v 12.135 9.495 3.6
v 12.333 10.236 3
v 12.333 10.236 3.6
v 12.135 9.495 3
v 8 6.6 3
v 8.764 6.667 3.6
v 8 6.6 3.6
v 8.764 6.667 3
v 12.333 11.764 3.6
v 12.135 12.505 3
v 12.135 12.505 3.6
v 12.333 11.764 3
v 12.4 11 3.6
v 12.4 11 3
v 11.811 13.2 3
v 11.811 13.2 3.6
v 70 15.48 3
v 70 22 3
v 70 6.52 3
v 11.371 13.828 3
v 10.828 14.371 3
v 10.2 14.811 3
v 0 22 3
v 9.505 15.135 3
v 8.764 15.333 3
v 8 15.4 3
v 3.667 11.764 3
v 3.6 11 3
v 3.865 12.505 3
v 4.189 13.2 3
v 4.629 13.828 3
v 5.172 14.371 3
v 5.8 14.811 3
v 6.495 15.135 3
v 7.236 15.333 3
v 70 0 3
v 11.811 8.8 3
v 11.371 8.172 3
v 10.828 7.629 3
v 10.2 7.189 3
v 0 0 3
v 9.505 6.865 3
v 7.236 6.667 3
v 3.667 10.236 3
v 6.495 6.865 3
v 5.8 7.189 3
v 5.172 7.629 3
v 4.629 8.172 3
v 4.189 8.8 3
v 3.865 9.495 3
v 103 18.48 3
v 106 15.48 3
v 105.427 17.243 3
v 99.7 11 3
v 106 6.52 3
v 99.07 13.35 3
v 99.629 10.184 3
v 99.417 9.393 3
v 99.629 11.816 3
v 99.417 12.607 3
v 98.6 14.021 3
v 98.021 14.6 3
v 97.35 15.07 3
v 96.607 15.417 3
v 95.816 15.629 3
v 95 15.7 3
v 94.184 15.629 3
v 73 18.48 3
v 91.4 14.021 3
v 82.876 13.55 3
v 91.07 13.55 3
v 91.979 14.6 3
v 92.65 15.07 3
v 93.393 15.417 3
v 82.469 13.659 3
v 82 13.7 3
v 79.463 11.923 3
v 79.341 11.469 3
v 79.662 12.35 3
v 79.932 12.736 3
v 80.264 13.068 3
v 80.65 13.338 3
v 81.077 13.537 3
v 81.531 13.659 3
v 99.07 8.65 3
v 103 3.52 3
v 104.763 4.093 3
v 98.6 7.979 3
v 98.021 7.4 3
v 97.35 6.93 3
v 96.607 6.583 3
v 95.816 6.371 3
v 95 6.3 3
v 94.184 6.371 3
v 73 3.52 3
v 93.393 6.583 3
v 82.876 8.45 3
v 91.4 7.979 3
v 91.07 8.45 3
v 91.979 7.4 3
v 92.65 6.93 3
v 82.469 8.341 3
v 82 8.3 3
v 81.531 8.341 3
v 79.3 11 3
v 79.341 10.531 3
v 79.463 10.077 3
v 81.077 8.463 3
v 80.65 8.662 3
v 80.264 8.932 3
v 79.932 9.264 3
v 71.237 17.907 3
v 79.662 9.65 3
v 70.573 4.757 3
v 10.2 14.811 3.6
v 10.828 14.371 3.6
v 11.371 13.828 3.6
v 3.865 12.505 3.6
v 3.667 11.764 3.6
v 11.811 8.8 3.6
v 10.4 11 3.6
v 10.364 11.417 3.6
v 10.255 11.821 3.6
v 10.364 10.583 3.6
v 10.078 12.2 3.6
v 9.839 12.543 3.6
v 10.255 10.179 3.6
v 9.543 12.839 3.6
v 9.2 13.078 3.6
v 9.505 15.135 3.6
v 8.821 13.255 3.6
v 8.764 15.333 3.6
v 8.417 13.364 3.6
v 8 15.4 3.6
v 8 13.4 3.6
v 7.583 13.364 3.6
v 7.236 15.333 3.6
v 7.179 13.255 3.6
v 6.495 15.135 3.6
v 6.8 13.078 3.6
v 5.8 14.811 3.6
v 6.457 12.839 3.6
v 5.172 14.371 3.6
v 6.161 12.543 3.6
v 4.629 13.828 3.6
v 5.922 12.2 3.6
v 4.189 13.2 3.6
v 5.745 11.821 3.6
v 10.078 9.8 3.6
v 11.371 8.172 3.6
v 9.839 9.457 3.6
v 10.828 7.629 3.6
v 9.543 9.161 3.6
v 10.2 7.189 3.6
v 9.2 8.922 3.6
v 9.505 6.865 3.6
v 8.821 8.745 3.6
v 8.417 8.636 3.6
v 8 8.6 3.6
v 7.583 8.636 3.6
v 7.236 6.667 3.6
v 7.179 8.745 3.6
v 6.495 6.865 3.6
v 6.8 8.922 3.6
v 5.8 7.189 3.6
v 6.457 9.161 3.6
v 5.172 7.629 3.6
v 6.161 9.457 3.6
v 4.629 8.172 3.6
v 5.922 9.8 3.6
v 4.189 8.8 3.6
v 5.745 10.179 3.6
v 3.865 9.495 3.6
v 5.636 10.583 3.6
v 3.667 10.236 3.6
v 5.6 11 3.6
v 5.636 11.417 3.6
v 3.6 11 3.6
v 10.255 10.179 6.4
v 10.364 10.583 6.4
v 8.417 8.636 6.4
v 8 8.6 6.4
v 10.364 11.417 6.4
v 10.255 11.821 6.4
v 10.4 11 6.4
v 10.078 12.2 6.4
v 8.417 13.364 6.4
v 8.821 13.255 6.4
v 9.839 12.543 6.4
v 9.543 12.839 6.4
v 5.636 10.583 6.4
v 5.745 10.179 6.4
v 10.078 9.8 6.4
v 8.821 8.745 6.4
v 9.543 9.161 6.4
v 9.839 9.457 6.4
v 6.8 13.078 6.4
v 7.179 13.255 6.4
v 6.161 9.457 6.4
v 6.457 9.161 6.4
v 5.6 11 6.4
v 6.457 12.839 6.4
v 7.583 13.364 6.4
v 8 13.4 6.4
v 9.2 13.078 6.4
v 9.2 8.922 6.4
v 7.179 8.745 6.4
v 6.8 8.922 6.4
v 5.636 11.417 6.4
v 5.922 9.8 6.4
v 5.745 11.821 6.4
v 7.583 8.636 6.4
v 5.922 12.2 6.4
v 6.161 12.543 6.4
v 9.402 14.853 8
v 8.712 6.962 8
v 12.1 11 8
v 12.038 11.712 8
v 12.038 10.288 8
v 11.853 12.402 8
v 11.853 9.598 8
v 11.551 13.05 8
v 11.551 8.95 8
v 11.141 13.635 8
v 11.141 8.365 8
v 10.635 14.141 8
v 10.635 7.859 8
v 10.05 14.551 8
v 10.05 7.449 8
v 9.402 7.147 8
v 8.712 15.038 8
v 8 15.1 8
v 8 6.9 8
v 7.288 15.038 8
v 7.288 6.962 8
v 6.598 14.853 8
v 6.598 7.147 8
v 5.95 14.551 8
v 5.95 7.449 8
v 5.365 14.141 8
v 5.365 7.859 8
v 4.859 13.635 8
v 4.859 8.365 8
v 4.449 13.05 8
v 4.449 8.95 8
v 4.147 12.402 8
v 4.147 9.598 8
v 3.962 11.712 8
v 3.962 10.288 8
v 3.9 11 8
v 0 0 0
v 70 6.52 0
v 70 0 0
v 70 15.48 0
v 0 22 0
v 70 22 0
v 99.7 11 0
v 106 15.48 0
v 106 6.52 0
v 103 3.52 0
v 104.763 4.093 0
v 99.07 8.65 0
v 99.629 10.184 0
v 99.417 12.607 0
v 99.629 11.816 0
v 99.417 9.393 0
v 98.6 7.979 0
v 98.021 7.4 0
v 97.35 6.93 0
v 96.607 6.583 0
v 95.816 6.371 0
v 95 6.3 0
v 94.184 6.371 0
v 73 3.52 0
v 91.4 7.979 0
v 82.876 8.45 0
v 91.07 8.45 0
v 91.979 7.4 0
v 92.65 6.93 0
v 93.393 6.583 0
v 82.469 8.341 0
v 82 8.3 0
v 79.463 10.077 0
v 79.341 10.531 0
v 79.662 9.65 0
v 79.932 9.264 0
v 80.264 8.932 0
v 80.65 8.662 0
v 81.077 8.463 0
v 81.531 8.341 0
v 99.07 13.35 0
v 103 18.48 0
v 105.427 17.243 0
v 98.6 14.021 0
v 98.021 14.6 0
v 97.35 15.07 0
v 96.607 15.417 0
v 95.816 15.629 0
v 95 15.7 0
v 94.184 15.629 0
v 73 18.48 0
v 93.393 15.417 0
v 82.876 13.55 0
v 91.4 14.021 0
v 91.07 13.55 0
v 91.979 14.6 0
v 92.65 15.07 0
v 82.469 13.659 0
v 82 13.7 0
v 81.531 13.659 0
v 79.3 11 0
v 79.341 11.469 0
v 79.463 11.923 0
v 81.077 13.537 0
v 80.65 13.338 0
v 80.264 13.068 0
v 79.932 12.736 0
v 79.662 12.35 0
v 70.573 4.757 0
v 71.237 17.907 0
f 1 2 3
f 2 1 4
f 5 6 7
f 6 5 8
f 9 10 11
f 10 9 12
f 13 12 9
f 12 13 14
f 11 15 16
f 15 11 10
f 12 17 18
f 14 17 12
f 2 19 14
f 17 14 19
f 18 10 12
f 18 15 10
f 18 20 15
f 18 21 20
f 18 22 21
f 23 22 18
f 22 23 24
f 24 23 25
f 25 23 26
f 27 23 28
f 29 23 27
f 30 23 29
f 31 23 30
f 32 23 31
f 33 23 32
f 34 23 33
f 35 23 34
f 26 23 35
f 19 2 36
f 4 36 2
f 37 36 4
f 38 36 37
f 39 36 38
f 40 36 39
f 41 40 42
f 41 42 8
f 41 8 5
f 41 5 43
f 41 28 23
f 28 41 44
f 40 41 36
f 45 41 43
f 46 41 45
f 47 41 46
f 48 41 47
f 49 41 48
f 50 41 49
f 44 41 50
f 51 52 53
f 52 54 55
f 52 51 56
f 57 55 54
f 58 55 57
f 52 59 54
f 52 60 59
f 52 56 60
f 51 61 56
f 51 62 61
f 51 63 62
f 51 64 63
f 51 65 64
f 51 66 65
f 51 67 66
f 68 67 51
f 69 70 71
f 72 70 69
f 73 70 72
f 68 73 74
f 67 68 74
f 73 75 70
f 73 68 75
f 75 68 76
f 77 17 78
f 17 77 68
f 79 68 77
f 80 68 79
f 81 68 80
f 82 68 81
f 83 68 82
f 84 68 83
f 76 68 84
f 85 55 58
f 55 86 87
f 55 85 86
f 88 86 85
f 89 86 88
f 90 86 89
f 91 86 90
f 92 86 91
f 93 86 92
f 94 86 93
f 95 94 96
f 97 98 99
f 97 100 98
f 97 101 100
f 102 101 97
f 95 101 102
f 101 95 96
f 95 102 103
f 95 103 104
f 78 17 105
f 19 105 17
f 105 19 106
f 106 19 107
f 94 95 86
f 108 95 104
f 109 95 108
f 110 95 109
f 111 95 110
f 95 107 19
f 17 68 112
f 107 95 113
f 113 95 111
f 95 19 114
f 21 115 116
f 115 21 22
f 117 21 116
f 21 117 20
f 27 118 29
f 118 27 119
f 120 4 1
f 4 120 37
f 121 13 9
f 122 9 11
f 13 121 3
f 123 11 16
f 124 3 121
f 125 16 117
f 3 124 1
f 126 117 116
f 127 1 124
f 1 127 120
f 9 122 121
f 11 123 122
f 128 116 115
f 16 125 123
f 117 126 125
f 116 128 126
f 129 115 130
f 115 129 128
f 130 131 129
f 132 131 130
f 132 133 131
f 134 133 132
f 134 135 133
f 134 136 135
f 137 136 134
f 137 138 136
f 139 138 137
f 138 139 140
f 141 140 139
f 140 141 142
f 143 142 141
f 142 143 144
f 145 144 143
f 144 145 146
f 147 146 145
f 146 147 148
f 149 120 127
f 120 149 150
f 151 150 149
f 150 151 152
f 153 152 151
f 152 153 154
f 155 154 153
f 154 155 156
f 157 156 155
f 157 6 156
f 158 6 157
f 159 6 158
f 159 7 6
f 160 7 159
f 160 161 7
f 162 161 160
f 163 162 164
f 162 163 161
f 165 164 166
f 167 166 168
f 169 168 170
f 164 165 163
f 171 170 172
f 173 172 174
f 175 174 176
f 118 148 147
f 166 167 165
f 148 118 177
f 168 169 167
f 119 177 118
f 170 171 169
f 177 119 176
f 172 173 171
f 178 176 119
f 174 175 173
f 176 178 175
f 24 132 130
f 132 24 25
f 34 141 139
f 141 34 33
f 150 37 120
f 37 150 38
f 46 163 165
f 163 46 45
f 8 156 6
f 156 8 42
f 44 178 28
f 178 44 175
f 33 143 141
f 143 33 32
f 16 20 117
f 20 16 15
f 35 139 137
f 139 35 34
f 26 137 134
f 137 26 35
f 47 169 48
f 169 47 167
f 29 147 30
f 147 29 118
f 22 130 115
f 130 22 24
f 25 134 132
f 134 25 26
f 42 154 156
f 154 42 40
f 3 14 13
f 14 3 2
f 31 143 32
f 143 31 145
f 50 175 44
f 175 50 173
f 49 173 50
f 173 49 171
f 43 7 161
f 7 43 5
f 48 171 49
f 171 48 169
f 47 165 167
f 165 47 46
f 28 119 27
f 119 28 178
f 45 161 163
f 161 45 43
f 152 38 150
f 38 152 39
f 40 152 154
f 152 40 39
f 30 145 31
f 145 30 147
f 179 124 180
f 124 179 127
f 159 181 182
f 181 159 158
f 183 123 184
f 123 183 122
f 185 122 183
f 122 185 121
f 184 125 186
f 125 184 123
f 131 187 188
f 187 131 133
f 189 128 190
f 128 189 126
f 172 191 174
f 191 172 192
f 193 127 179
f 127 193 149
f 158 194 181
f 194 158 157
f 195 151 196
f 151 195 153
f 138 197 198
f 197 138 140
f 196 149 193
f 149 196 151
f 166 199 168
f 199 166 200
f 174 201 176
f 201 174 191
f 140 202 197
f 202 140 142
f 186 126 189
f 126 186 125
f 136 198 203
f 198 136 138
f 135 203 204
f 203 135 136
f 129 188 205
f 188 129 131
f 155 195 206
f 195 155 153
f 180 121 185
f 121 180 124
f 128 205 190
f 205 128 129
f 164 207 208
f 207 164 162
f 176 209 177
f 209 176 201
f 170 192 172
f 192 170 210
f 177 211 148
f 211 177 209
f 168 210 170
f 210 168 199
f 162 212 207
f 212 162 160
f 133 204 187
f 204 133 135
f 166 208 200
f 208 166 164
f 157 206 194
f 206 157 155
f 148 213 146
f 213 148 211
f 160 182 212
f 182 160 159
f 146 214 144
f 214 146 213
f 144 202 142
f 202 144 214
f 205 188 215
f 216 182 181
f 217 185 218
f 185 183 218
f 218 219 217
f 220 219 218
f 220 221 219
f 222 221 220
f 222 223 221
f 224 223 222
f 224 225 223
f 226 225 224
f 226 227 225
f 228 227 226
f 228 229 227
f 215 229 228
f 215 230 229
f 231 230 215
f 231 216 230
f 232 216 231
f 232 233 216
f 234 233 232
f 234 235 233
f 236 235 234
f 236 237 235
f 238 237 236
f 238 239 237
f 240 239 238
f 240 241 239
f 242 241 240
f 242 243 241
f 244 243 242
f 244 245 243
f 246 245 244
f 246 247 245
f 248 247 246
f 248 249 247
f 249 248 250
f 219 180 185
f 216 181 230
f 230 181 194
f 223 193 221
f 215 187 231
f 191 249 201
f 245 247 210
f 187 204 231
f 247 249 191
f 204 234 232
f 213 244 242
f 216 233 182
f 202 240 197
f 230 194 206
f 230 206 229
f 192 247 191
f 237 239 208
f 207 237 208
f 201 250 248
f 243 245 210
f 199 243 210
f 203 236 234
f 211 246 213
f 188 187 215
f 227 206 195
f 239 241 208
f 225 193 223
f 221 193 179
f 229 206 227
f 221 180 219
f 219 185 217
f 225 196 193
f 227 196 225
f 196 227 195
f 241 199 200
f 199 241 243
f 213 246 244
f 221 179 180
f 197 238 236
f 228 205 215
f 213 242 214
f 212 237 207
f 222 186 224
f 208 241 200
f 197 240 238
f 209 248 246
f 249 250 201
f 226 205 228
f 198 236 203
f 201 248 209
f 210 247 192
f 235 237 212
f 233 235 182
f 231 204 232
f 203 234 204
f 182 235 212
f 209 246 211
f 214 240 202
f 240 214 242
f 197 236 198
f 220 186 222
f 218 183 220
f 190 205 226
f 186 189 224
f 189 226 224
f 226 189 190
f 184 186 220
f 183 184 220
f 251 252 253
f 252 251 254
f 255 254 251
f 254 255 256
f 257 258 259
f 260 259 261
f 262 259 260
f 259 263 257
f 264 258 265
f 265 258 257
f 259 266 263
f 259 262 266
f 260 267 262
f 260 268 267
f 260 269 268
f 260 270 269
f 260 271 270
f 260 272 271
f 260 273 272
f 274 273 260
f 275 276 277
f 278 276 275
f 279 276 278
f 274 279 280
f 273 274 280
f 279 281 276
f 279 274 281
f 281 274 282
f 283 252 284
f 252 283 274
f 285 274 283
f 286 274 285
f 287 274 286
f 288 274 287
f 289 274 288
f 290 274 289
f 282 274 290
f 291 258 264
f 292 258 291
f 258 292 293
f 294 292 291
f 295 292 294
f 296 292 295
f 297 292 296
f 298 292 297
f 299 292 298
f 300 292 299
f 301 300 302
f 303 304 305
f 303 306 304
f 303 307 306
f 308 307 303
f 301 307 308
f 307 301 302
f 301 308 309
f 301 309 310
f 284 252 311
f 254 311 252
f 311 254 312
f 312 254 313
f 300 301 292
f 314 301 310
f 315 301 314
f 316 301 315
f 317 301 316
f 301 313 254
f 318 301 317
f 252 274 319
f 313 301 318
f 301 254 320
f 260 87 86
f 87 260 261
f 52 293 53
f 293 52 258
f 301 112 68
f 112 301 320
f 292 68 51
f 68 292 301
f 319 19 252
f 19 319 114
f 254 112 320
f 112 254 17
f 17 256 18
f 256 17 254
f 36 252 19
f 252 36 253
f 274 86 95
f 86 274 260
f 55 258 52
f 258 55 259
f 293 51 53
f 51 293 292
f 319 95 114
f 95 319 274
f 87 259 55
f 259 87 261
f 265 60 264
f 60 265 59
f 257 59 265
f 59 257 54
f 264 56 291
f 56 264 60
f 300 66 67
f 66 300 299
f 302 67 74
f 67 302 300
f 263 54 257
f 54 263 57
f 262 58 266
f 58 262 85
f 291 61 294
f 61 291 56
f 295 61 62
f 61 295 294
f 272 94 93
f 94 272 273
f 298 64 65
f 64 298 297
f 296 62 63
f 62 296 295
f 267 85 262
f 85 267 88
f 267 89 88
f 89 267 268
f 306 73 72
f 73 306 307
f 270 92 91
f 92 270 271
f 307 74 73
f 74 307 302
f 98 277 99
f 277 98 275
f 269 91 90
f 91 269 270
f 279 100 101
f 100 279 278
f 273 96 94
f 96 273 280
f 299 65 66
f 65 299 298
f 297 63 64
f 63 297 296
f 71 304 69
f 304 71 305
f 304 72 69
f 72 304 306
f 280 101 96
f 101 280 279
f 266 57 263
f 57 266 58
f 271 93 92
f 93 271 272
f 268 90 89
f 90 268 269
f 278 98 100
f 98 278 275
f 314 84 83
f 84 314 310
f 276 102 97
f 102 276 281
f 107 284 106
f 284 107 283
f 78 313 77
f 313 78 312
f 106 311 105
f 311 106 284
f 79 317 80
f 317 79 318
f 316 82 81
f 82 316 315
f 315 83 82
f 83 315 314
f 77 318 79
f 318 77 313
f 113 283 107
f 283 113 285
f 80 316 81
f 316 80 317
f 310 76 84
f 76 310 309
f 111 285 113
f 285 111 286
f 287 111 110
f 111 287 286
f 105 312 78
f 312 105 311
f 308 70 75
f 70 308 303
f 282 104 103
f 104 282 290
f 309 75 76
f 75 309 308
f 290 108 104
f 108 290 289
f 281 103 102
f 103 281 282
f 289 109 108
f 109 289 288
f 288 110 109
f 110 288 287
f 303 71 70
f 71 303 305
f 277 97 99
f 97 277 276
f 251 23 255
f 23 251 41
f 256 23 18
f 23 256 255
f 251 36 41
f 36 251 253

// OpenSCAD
// latches/mushroom_keyhole.scad — low-profile mushroom post with a keyhole tab.
// MIT licensed.
//
// Closure idea: push the mushroom head through the large entry hole, then pull
// the tab so the shaft slides into the smaller capture hole. TPU stretch keeps
// the narrow throat from releasing accidentally.

MUSHROOM_POST_INSET    = 8;
MUSHROOM_SHAFT_D       = 4.8;
MUSHROOM_HEAD_D        = 8.2;
MUSHROOM_SHAFT_HEIGHT  = 3.4;
MUSHROOM_HEAD_HEIGHT   = 1.6;
MUSHROOM_BASE_D        = 8.8;
MUSHROOM_TAB_LENGTH    = 36;
MUSHROOM_TAB_WIDTH_FR  = 0.68;
MUSHROOM_ENTRY_D       = 9.4;
MUSHROOM_CAPTURE_D     = 5.4;
MUSHROOM_THROAT_W      = 5.1;
MUSHROOM_ENTRY_X       = 25;
MUSHROOM_CAPTURE_X     = 12;

module _mk_round_rect_2d(length, width, radius) {
    offset(r = radius) offset(delta = -radius)
        square([length, width], center = false);
}

module _mushroom_post(band_width, band_thickness) {
    translate([MUSHROOM_POST_INSET, band_width / 2, band_thickness])
        union() {
            cylinder(h = 0.6, d = MUSHROOM_BASE_D, $fn = 36);
            cylinder(h = MUSHROOM_SHAFT_HEIGHT, d = MUSHROOM_SHAFT_D, $fn = 36);
            translate([0, 0, MUSHROOM_SHAFT_HEIGHT])
                cylinder(
                    h = MUSHROOM_HEAD_HEIGHT,
                    r1 = MUSHROOM_SHAFT_D / 2,
                    r2 = MUSHROOM_HEAD_D / 2,
                    $fn = 36
                );
        }
}

module _mushroom_keyhole_tab(band_width, band_thickness) {
    tab_w = min(band_width * MUSHROOM_TAB_WIDTH_FR, band_width - 4);
    y0 = (band_width - tab_w) / 2;
    cy = band_width / 2;

    translate([0, y0, 0])
        difference() {
            linear_extrude(height = band_thickness)
                _mk_round_rect_2d(MUSHROOM_TAB_LENGTH, tab_w, 3);

            translate([MUSHROOM_ENTRY_X, cy - y0, -0.1])
                cylinder(h = band_thickness + 0.2, d = MUSHROOM_ENTRY_D, $fn = 36);

            translate([MUSHROOM_CAPTURE_X, cy - y0, -0.1])
                cylinder(h = band_thickness + 0.2, d = MUSHROOM_CAPTURE_D, $fn = 36);

            translate([
                MUSHROOM_CAPTURE_X,
                cy - y0 - MUSHROOM_THROAT_W / 2,
                -0.1
            ])
                cube([
                    MUSHROOM_ENTRY_X - MUSHROOM_CAPTURE_X,
                    MUSHROOM_THROAT_W,
                    band_thickness + 0.2
                ]);
        }
}

module latch_mushroom_keyhole(band_width, band_thickness, end = "both") {
    if (end == "left" || end == "both")
        _mushroom_post(band_width, band_thickness);

    if (end == "right" || end == "both")
        _mushroom_keyhole_tab(band_width, band_thickness);
}

// development render
translate([0, 0, 0]) cube([70, 22, 3]);
latch_mushroom_keyhole(22, 3, end = "left");
translate([70, 0, 0]) latch_mushroom_keyhole(22, 3, end = "right");
